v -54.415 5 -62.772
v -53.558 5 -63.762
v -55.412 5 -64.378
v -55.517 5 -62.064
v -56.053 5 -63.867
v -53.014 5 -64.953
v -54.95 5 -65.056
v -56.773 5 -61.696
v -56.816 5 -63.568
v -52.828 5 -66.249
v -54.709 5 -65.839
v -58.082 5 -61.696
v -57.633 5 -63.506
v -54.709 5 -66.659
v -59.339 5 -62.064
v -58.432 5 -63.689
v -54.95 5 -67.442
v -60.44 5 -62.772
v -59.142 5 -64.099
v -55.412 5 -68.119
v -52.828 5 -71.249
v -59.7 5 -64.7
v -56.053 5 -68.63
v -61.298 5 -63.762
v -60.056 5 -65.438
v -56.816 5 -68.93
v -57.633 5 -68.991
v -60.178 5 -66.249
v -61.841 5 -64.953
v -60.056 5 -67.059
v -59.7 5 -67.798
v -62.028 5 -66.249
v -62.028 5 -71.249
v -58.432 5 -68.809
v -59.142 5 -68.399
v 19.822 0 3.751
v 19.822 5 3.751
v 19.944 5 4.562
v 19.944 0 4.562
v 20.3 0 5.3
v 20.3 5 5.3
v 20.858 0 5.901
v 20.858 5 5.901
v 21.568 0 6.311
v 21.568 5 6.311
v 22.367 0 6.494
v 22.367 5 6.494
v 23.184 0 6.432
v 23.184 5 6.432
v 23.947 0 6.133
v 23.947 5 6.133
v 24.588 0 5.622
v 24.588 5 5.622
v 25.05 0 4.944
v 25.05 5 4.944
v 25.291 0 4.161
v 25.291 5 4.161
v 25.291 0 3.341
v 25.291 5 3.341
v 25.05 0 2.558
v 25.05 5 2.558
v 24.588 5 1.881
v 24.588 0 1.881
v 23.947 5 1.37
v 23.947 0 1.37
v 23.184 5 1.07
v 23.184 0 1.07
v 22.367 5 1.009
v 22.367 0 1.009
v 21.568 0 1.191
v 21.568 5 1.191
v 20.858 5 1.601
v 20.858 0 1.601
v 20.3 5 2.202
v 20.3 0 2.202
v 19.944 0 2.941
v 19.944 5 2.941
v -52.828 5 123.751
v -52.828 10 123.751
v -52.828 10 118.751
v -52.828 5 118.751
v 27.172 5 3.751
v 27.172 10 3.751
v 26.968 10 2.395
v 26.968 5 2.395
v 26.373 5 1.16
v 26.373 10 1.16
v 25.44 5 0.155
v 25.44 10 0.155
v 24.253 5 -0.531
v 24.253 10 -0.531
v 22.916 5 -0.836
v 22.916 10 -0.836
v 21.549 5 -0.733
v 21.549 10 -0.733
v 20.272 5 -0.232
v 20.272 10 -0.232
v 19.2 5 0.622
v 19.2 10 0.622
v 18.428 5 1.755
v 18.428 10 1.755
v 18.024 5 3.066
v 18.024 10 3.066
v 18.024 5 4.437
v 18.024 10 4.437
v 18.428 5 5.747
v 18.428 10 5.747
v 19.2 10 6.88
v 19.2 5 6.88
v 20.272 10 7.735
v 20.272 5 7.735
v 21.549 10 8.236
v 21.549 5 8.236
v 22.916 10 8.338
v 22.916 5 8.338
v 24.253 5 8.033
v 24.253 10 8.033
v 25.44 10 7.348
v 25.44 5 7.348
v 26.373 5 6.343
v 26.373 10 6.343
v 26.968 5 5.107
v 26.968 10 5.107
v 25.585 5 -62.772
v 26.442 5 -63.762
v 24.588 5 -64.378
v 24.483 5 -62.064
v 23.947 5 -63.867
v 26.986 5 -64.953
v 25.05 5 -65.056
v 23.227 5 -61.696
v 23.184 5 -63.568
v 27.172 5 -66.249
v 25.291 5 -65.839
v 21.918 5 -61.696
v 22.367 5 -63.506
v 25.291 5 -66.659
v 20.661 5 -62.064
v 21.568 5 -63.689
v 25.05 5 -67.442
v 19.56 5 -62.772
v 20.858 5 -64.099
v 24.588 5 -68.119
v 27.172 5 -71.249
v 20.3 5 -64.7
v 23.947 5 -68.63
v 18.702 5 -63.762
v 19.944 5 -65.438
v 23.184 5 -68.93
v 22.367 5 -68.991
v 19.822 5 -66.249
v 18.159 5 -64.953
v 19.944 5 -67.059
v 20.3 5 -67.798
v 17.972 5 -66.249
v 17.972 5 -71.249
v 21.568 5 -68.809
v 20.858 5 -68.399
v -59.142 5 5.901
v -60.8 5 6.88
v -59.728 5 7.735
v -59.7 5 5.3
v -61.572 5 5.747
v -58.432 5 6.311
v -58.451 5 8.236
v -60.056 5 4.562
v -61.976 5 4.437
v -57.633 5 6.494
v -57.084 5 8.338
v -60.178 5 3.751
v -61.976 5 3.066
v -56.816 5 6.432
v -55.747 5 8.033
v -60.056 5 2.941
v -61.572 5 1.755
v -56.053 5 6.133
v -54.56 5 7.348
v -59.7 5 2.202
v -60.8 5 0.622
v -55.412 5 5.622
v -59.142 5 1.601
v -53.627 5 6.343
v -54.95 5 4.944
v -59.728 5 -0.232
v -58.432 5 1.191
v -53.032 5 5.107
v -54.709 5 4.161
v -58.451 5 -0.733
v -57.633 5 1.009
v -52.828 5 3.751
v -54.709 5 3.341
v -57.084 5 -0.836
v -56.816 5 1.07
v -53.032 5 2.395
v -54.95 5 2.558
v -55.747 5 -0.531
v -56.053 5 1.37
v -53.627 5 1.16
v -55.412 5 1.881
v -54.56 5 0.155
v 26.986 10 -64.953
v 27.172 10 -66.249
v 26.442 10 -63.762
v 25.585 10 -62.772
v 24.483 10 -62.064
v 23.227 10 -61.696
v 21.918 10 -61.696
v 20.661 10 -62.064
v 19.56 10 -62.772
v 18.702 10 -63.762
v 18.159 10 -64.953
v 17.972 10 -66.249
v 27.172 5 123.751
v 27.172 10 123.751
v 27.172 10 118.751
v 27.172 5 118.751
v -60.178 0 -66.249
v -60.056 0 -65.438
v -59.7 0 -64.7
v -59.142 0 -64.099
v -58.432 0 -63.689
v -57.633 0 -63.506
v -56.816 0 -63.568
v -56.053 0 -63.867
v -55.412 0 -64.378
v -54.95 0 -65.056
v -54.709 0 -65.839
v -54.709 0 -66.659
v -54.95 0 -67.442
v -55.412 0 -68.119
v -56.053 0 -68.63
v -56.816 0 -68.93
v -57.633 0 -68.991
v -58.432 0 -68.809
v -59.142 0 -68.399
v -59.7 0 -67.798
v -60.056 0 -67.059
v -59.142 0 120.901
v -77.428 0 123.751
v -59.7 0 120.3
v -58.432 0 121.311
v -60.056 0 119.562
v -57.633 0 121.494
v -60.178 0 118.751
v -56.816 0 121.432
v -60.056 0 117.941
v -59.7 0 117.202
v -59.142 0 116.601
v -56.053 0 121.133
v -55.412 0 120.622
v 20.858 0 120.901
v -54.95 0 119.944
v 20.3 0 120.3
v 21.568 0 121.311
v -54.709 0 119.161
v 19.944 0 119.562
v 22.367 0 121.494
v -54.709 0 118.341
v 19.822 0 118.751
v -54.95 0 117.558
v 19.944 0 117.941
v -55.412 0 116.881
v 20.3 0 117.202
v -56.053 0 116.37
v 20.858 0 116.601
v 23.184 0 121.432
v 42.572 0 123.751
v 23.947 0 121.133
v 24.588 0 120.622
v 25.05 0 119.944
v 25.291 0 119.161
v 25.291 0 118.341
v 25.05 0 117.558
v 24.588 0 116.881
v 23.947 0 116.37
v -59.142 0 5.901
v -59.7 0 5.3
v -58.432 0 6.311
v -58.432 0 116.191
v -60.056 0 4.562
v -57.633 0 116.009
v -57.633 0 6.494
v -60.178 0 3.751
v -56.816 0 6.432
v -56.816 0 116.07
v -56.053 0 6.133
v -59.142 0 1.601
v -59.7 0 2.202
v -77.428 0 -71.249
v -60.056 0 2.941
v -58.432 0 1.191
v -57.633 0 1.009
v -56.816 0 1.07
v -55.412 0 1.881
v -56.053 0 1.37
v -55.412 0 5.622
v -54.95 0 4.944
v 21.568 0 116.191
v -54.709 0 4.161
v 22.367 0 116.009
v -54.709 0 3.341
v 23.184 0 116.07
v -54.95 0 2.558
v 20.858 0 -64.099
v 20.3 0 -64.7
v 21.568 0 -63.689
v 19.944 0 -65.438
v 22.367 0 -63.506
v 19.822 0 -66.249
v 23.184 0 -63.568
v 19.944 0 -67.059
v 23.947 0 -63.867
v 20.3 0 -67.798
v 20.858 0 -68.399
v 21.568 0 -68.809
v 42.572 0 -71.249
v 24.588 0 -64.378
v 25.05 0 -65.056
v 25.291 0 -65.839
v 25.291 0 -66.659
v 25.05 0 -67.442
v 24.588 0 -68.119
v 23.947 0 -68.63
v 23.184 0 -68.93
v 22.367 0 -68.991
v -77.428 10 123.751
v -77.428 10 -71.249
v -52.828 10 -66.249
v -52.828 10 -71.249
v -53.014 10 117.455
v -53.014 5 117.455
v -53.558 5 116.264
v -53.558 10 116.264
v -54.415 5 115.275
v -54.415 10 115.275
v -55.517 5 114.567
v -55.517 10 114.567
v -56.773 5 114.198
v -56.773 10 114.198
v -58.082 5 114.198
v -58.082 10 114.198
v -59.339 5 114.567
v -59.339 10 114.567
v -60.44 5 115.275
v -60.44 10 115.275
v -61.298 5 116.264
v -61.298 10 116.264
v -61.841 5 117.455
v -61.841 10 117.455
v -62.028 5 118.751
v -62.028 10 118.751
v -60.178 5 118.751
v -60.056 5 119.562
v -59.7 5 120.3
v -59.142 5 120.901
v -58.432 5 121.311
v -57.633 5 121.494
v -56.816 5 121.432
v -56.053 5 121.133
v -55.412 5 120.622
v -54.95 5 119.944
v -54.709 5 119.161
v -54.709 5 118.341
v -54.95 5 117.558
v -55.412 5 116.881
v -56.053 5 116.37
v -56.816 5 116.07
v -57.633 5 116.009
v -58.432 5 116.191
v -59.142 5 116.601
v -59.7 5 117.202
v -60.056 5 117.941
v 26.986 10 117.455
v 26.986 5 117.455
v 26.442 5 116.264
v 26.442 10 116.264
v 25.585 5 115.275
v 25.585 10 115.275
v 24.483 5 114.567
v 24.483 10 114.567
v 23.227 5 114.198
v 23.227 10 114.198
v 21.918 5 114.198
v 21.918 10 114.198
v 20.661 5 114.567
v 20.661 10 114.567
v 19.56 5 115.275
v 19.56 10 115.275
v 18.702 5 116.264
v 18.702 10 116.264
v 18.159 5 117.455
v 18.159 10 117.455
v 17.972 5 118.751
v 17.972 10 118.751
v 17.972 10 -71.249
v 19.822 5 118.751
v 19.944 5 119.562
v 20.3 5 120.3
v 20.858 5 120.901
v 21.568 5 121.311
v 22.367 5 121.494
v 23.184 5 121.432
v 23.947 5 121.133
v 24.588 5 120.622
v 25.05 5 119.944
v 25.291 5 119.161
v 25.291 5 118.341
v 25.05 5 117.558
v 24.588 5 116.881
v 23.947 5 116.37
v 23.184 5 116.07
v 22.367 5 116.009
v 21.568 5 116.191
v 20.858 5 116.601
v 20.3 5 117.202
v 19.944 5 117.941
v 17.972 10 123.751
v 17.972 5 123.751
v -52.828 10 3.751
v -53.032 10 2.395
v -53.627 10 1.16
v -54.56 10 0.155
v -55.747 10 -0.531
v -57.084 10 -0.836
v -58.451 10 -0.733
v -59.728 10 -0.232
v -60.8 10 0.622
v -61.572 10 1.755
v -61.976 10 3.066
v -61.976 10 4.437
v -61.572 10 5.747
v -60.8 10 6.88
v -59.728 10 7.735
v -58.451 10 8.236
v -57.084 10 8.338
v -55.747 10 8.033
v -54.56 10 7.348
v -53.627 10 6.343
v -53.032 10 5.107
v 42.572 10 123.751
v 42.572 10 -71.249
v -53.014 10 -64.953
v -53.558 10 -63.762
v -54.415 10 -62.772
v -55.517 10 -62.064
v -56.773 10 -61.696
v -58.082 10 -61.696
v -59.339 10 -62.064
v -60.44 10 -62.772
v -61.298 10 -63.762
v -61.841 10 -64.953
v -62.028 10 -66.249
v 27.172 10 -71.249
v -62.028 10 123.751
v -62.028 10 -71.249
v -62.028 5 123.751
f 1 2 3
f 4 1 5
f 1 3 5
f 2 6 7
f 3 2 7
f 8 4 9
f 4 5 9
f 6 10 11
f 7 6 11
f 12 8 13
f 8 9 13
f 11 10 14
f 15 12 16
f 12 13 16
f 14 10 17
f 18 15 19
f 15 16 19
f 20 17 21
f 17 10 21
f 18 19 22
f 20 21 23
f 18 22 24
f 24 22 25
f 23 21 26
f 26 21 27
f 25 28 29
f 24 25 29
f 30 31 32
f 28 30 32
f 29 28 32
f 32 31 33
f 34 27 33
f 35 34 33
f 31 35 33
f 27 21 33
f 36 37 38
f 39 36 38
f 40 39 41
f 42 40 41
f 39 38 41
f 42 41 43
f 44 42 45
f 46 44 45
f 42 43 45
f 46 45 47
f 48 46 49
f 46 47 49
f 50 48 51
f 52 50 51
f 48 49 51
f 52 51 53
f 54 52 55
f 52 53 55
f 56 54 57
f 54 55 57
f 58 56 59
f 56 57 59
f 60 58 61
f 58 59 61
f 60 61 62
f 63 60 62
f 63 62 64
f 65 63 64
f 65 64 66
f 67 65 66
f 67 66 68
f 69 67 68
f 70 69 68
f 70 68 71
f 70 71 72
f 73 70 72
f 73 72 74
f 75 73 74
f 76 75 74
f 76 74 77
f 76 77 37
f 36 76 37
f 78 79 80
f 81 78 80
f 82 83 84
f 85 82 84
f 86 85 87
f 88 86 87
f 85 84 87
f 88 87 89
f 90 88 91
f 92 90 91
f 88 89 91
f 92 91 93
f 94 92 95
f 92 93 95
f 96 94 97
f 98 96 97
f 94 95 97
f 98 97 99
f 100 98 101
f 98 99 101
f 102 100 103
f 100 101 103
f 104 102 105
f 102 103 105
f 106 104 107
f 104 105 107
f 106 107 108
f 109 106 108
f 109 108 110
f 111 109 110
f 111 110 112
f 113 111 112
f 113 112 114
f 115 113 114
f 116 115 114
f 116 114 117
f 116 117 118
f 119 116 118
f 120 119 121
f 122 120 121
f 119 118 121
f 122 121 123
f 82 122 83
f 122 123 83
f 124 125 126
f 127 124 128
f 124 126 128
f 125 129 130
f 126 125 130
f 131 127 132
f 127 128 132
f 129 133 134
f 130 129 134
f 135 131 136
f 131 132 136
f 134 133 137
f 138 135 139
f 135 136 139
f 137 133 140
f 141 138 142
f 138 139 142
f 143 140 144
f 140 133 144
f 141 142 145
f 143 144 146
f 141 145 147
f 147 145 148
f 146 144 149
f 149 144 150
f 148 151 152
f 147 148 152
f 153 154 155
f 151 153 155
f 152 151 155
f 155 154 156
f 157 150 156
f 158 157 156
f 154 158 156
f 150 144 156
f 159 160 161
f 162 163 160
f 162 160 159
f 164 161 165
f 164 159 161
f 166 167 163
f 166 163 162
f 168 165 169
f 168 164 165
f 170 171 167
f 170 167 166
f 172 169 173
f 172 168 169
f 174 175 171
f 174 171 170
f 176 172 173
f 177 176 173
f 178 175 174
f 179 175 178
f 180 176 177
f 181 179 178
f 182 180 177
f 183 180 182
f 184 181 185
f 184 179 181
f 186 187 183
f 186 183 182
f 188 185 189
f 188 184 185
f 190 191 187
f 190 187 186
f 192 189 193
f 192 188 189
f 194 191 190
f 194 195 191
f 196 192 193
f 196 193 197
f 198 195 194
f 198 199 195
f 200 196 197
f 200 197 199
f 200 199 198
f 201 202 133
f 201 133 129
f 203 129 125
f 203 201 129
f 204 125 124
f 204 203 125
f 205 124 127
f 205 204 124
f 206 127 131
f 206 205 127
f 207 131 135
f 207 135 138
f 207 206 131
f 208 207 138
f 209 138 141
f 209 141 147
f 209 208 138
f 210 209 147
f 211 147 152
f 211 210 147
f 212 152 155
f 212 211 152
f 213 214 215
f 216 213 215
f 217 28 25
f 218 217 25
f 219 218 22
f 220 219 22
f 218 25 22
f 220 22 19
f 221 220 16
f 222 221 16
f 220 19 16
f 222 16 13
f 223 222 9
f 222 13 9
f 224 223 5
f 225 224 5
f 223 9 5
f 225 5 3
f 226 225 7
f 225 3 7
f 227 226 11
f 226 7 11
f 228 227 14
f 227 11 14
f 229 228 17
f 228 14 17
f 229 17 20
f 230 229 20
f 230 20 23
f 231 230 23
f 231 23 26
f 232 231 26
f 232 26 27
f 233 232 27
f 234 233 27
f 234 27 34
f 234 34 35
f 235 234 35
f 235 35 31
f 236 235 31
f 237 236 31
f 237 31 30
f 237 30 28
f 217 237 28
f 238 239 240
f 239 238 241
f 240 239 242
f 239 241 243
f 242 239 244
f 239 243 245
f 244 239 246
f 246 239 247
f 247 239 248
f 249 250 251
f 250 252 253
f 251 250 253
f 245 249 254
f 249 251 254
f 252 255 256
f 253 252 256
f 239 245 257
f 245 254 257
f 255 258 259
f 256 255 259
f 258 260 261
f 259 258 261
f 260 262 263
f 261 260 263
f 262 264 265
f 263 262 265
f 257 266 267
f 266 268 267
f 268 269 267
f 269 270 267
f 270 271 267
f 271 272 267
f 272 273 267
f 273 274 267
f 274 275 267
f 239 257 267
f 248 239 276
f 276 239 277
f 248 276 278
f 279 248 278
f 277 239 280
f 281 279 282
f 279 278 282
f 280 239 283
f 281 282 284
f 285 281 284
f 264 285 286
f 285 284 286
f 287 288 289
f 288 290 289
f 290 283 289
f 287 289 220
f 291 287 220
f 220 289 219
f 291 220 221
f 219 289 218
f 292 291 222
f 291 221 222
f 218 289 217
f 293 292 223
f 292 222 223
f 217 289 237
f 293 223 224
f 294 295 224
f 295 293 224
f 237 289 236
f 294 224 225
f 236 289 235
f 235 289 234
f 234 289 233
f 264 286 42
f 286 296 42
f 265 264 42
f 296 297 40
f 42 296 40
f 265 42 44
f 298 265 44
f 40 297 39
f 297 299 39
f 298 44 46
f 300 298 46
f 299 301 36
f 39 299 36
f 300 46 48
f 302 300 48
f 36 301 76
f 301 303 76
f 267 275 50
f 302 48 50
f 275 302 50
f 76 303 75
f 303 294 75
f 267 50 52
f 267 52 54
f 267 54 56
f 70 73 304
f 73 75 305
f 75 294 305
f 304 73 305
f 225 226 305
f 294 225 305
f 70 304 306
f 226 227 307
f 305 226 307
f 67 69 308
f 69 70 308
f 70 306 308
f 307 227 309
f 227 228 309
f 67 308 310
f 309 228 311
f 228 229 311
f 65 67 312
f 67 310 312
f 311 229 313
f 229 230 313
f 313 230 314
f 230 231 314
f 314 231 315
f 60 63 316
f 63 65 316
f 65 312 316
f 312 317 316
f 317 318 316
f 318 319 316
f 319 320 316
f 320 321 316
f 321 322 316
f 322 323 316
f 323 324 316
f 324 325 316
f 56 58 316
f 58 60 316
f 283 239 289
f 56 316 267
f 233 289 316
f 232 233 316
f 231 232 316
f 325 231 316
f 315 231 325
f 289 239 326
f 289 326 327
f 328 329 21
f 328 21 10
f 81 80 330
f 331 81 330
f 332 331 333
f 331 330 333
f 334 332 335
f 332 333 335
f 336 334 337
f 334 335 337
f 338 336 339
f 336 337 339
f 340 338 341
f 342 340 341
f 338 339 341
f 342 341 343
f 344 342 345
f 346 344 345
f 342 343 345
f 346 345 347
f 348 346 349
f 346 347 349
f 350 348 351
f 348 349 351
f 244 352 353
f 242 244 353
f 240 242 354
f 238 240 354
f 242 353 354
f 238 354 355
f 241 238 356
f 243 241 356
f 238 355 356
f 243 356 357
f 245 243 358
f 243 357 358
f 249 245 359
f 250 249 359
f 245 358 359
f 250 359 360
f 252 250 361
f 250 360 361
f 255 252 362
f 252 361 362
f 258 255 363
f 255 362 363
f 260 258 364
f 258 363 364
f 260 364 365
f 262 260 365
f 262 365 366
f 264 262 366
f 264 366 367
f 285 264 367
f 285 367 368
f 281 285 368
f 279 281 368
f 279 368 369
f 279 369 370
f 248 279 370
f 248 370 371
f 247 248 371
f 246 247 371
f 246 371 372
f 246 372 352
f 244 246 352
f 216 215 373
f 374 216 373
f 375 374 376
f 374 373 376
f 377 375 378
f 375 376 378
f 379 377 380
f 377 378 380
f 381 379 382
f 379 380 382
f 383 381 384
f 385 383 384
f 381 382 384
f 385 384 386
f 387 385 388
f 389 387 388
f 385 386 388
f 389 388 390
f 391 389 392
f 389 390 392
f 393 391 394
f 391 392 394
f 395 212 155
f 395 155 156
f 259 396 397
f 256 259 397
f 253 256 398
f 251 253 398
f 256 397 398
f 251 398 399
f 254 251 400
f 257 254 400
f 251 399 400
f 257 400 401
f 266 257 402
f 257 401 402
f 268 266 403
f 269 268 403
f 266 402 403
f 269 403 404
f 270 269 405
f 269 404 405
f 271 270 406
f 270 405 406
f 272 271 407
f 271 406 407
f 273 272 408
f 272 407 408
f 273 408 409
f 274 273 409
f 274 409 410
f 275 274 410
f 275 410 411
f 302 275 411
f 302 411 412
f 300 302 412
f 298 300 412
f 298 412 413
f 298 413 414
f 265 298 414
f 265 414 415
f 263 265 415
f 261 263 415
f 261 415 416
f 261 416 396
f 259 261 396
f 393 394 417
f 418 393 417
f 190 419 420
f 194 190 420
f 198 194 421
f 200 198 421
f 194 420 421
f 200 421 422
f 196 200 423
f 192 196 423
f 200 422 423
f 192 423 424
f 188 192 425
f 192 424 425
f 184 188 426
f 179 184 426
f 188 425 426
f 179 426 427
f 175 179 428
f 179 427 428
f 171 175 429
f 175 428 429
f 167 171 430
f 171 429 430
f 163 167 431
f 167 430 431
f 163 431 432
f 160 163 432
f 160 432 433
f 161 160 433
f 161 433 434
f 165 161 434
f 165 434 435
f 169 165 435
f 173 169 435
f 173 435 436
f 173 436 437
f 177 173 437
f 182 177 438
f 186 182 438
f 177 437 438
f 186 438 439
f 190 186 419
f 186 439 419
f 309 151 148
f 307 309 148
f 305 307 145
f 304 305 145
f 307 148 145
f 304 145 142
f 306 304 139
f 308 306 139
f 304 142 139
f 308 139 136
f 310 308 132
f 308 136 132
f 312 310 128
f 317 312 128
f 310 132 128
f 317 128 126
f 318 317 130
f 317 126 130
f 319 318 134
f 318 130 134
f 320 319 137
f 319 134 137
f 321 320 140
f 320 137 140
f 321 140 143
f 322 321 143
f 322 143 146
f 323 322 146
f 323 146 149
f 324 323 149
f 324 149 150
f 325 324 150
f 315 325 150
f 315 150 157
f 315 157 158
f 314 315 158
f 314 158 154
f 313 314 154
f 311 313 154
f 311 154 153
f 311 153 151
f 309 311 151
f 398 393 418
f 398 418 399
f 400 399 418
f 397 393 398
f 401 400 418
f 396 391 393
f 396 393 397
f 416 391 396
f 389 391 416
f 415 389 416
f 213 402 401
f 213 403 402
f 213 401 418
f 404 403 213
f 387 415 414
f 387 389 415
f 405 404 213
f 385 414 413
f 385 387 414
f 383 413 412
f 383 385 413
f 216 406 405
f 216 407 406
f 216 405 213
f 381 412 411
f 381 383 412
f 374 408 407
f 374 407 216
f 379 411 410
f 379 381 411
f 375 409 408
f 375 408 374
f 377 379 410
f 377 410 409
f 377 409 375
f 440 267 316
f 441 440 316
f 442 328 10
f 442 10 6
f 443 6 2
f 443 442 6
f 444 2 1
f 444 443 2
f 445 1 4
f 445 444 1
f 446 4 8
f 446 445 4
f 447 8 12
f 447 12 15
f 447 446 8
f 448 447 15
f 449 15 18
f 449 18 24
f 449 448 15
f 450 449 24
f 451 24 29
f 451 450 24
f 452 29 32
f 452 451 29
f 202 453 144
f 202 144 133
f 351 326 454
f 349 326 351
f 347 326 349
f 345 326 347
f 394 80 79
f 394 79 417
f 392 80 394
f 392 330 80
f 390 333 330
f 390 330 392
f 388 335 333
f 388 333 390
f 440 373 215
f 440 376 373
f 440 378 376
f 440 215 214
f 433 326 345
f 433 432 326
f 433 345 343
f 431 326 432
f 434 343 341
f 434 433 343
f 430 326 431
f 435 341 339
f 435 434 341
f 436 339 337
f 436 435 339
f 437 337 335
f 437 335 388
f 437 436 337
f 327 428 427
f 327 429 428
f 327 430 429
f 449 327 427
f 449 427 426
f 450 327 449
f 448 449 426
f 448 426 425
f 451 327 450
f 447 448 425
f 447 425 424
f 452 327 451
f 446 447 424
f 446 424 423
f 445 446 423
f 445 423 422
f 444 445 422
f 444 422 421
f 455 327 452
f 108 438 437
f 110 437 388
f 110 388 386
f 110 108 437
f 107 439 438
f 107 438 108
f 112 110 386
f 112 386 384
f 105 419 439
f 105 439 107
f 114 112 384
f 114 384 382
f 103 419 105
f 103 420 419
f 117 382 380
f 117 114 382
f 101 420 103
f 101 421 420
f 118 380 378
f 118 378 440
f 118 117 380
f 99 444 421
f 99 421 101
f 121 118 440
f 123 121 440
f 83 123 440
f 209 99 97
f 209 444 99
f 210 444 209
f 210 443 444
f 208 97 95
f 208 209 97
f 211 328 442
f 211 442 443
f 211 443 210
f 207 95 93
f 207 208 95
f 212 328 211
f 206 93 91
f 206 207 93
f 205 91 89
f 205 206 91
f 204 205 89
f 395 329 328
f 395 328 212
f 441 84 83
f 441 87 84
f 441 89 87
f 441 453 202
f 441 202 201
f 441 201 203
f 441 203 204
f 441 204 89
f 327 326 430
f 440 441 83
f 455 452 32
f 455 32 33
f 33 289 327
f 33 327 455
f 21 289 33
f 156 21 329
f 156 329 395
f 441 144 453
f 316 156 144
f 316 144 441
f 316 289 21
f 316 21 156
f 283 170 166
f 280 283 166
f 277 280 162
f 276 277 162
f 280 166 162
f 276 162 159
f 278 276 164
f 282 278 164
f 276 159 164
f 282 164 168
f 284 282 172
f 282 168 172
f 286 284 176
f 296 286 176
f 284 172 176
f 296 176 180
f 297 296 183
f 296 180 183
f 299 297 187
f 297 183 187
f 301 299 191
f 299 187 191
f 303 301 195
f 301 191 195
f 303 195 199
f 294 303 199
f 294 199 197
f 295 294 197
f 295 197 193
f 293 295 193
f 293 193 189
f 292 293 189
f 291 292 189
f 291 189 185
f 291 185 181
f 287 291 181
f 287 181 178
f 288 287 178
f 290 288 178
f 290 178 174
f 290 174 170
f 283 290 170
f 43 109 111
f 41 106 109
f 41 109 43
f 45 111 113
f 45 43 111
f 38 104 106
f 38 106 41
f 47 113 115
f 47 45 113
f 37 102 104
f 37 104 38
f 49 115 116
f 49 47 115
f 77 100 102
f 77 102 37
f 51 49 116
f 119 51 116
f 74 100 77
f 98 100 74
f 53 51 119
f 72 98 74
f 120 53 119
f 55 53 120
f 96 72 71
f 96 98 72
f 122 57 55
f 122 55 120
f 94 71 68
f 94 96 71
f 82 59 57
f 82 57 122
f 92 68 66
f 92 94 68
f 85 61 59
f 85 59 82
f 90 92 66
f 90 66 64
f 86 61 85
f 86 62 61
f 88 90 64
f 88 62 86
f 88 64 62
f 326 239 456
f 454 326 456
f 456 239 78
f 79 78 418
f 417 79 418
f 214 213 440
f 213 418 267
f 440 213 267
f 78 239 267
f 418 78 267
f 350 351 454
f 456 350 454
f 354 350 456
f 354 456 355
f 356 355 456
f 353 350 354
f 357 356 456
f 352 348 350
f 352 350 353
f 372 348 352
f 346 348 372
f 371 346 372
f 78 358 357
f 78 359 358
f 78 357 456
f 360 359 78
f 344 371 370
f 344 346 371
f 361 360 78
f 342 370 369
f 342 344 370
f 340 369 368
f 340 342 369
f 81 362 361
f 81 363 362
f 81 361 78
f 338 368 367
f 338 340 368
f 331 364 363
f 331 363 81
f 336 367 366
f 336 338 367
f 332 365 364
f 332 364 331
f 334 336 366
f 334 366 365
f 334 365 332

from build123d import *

# Parameters (mm, degrees)
SKETCH1_W           = 120
SKETCH1_H           = 195
BOSS_EXTRUDE1_DEPTH = 10
SKETCH2_R           = 2.75
CUT_EXTRUDE1_DEPTH  = 11
SKETCH3_R           = 4.6
CUT_EXTRUDE2_DEPTH  = 5


with BuildPart() as part:
    # Sketch1 → Boss-Extrude1 (new body)
    with BuildSketch(Plane(origin=(0, 0, 0), x_dir=(1, 0, 0), z_dir=(0, 1, 0))):
        with Locations((-17.427799272, -26.251292201)):
            Rectangle(SKETCH1_W, SKETCH1_H)
    extrude(amount=BOSS_EXTRUDE1_DEPTH)

    # Sketch2 → Cut-Extrude1 (cut, through all)
    with BuildSketch(Plane(origin=(0, 10, 0), x_dir=(-1, 0, 0), z_dir=(0, 1, 0))):
        with Locations((-22.572200728, 118.751292201)):
            Circle(SKETCH2_R)
        with Locations((57.427799272, 118.751292201)):
            Circle(SKETCH2_R)
        with Locations((-22.572200728, 3.751292201)):
            Circle(SKETCH2_R)
        with Locations((57.427799272, 3.751292201)):
            Circle(SKETCH2_R)
        with Locations((-22.572200728, -66.248707799)):
            Circle(SKETCH2_R)
        with Locations((57.427799272, -66.248707799)):
            Circle(SKETCH2_R)
    extrude(amount=-CUT_EXTRUDE1_DEPTH, mode=Mode.SUBTRACT)

    # Sketch3 → Cut-Extrude2 (cut)
    with BuildSketch(Plane(origin=(0, 10, 0), x_dir=(1, 0, 0), z_dir=(0, 1, 0))):
        with Locations((22.572200728, -3.751292201)):
            Circle(SKETCH3_R)
        with Locations((-57.427799272, -3.751292201)):
            Circle(SKETCH3_R)
        with BuildLine():
            Line((-62.027799272, 66.248707799), (-62.027799272, 71.248707799))
            Line((-62.027799272, 71.248707799), (-52.827799272, 71.248707799))
            Line((-52.827799272, 71.248707799), (-52.827799272, 66.248707799))
            ThreePointArc((-52.827799272, 66.248707799), (-57.427799272, 61.648707799), (-62.027799272, 66.248707799))
        make_face()
        with BuildLine():
            Line((17.972200728, 66.248707799), (17.972200728, 71.248707799))
            Line((17.972200728, 71.248707799), (27.172200728, 71.248707799))
            Line((27.172200728, 71.248707799), (27.172200728, 66.248707799))
            ThreePointArc((27.172200728, 66.248707799), (22.572200728, 61.648707799), (17.972200728, 66.248707799))
        make_face()
        with BuildLine():
            Line((-62.027799272, -118.751292201), (-62.027799272, -123.751292201))
            Line((-62.027799272, -123.751292201), (-52.827799272, -123.751292201))
            Line((-52.827799272, -123.751292201), (-52.827799272, -118.751292201))
            ThreePointArc((-52.827799272, -118.751292201), (-57.427799272, -114.151292201), (-62.027799272, -118.751292201))
        make_face()
        with BuildLine():
            Line((17.972200728, -118.751292201), (17.972200728, -123.751292201))
            Line((17.972200728, -123.751292201), (27.172200728, -123.751292201))
            Line((27.172200728, -123.751292201), (27.172200728, -118.751292201))
            ThreePointArc((27.172200728, -118.751292201), (22.572200728, -114.151292201), (17.972200728, -118.751292201))
        make_face()
    extrude(amount=-CUT_EXTRUDE2_DEPTH, mode=Mode.SUBTRACT)


solid = part.part
